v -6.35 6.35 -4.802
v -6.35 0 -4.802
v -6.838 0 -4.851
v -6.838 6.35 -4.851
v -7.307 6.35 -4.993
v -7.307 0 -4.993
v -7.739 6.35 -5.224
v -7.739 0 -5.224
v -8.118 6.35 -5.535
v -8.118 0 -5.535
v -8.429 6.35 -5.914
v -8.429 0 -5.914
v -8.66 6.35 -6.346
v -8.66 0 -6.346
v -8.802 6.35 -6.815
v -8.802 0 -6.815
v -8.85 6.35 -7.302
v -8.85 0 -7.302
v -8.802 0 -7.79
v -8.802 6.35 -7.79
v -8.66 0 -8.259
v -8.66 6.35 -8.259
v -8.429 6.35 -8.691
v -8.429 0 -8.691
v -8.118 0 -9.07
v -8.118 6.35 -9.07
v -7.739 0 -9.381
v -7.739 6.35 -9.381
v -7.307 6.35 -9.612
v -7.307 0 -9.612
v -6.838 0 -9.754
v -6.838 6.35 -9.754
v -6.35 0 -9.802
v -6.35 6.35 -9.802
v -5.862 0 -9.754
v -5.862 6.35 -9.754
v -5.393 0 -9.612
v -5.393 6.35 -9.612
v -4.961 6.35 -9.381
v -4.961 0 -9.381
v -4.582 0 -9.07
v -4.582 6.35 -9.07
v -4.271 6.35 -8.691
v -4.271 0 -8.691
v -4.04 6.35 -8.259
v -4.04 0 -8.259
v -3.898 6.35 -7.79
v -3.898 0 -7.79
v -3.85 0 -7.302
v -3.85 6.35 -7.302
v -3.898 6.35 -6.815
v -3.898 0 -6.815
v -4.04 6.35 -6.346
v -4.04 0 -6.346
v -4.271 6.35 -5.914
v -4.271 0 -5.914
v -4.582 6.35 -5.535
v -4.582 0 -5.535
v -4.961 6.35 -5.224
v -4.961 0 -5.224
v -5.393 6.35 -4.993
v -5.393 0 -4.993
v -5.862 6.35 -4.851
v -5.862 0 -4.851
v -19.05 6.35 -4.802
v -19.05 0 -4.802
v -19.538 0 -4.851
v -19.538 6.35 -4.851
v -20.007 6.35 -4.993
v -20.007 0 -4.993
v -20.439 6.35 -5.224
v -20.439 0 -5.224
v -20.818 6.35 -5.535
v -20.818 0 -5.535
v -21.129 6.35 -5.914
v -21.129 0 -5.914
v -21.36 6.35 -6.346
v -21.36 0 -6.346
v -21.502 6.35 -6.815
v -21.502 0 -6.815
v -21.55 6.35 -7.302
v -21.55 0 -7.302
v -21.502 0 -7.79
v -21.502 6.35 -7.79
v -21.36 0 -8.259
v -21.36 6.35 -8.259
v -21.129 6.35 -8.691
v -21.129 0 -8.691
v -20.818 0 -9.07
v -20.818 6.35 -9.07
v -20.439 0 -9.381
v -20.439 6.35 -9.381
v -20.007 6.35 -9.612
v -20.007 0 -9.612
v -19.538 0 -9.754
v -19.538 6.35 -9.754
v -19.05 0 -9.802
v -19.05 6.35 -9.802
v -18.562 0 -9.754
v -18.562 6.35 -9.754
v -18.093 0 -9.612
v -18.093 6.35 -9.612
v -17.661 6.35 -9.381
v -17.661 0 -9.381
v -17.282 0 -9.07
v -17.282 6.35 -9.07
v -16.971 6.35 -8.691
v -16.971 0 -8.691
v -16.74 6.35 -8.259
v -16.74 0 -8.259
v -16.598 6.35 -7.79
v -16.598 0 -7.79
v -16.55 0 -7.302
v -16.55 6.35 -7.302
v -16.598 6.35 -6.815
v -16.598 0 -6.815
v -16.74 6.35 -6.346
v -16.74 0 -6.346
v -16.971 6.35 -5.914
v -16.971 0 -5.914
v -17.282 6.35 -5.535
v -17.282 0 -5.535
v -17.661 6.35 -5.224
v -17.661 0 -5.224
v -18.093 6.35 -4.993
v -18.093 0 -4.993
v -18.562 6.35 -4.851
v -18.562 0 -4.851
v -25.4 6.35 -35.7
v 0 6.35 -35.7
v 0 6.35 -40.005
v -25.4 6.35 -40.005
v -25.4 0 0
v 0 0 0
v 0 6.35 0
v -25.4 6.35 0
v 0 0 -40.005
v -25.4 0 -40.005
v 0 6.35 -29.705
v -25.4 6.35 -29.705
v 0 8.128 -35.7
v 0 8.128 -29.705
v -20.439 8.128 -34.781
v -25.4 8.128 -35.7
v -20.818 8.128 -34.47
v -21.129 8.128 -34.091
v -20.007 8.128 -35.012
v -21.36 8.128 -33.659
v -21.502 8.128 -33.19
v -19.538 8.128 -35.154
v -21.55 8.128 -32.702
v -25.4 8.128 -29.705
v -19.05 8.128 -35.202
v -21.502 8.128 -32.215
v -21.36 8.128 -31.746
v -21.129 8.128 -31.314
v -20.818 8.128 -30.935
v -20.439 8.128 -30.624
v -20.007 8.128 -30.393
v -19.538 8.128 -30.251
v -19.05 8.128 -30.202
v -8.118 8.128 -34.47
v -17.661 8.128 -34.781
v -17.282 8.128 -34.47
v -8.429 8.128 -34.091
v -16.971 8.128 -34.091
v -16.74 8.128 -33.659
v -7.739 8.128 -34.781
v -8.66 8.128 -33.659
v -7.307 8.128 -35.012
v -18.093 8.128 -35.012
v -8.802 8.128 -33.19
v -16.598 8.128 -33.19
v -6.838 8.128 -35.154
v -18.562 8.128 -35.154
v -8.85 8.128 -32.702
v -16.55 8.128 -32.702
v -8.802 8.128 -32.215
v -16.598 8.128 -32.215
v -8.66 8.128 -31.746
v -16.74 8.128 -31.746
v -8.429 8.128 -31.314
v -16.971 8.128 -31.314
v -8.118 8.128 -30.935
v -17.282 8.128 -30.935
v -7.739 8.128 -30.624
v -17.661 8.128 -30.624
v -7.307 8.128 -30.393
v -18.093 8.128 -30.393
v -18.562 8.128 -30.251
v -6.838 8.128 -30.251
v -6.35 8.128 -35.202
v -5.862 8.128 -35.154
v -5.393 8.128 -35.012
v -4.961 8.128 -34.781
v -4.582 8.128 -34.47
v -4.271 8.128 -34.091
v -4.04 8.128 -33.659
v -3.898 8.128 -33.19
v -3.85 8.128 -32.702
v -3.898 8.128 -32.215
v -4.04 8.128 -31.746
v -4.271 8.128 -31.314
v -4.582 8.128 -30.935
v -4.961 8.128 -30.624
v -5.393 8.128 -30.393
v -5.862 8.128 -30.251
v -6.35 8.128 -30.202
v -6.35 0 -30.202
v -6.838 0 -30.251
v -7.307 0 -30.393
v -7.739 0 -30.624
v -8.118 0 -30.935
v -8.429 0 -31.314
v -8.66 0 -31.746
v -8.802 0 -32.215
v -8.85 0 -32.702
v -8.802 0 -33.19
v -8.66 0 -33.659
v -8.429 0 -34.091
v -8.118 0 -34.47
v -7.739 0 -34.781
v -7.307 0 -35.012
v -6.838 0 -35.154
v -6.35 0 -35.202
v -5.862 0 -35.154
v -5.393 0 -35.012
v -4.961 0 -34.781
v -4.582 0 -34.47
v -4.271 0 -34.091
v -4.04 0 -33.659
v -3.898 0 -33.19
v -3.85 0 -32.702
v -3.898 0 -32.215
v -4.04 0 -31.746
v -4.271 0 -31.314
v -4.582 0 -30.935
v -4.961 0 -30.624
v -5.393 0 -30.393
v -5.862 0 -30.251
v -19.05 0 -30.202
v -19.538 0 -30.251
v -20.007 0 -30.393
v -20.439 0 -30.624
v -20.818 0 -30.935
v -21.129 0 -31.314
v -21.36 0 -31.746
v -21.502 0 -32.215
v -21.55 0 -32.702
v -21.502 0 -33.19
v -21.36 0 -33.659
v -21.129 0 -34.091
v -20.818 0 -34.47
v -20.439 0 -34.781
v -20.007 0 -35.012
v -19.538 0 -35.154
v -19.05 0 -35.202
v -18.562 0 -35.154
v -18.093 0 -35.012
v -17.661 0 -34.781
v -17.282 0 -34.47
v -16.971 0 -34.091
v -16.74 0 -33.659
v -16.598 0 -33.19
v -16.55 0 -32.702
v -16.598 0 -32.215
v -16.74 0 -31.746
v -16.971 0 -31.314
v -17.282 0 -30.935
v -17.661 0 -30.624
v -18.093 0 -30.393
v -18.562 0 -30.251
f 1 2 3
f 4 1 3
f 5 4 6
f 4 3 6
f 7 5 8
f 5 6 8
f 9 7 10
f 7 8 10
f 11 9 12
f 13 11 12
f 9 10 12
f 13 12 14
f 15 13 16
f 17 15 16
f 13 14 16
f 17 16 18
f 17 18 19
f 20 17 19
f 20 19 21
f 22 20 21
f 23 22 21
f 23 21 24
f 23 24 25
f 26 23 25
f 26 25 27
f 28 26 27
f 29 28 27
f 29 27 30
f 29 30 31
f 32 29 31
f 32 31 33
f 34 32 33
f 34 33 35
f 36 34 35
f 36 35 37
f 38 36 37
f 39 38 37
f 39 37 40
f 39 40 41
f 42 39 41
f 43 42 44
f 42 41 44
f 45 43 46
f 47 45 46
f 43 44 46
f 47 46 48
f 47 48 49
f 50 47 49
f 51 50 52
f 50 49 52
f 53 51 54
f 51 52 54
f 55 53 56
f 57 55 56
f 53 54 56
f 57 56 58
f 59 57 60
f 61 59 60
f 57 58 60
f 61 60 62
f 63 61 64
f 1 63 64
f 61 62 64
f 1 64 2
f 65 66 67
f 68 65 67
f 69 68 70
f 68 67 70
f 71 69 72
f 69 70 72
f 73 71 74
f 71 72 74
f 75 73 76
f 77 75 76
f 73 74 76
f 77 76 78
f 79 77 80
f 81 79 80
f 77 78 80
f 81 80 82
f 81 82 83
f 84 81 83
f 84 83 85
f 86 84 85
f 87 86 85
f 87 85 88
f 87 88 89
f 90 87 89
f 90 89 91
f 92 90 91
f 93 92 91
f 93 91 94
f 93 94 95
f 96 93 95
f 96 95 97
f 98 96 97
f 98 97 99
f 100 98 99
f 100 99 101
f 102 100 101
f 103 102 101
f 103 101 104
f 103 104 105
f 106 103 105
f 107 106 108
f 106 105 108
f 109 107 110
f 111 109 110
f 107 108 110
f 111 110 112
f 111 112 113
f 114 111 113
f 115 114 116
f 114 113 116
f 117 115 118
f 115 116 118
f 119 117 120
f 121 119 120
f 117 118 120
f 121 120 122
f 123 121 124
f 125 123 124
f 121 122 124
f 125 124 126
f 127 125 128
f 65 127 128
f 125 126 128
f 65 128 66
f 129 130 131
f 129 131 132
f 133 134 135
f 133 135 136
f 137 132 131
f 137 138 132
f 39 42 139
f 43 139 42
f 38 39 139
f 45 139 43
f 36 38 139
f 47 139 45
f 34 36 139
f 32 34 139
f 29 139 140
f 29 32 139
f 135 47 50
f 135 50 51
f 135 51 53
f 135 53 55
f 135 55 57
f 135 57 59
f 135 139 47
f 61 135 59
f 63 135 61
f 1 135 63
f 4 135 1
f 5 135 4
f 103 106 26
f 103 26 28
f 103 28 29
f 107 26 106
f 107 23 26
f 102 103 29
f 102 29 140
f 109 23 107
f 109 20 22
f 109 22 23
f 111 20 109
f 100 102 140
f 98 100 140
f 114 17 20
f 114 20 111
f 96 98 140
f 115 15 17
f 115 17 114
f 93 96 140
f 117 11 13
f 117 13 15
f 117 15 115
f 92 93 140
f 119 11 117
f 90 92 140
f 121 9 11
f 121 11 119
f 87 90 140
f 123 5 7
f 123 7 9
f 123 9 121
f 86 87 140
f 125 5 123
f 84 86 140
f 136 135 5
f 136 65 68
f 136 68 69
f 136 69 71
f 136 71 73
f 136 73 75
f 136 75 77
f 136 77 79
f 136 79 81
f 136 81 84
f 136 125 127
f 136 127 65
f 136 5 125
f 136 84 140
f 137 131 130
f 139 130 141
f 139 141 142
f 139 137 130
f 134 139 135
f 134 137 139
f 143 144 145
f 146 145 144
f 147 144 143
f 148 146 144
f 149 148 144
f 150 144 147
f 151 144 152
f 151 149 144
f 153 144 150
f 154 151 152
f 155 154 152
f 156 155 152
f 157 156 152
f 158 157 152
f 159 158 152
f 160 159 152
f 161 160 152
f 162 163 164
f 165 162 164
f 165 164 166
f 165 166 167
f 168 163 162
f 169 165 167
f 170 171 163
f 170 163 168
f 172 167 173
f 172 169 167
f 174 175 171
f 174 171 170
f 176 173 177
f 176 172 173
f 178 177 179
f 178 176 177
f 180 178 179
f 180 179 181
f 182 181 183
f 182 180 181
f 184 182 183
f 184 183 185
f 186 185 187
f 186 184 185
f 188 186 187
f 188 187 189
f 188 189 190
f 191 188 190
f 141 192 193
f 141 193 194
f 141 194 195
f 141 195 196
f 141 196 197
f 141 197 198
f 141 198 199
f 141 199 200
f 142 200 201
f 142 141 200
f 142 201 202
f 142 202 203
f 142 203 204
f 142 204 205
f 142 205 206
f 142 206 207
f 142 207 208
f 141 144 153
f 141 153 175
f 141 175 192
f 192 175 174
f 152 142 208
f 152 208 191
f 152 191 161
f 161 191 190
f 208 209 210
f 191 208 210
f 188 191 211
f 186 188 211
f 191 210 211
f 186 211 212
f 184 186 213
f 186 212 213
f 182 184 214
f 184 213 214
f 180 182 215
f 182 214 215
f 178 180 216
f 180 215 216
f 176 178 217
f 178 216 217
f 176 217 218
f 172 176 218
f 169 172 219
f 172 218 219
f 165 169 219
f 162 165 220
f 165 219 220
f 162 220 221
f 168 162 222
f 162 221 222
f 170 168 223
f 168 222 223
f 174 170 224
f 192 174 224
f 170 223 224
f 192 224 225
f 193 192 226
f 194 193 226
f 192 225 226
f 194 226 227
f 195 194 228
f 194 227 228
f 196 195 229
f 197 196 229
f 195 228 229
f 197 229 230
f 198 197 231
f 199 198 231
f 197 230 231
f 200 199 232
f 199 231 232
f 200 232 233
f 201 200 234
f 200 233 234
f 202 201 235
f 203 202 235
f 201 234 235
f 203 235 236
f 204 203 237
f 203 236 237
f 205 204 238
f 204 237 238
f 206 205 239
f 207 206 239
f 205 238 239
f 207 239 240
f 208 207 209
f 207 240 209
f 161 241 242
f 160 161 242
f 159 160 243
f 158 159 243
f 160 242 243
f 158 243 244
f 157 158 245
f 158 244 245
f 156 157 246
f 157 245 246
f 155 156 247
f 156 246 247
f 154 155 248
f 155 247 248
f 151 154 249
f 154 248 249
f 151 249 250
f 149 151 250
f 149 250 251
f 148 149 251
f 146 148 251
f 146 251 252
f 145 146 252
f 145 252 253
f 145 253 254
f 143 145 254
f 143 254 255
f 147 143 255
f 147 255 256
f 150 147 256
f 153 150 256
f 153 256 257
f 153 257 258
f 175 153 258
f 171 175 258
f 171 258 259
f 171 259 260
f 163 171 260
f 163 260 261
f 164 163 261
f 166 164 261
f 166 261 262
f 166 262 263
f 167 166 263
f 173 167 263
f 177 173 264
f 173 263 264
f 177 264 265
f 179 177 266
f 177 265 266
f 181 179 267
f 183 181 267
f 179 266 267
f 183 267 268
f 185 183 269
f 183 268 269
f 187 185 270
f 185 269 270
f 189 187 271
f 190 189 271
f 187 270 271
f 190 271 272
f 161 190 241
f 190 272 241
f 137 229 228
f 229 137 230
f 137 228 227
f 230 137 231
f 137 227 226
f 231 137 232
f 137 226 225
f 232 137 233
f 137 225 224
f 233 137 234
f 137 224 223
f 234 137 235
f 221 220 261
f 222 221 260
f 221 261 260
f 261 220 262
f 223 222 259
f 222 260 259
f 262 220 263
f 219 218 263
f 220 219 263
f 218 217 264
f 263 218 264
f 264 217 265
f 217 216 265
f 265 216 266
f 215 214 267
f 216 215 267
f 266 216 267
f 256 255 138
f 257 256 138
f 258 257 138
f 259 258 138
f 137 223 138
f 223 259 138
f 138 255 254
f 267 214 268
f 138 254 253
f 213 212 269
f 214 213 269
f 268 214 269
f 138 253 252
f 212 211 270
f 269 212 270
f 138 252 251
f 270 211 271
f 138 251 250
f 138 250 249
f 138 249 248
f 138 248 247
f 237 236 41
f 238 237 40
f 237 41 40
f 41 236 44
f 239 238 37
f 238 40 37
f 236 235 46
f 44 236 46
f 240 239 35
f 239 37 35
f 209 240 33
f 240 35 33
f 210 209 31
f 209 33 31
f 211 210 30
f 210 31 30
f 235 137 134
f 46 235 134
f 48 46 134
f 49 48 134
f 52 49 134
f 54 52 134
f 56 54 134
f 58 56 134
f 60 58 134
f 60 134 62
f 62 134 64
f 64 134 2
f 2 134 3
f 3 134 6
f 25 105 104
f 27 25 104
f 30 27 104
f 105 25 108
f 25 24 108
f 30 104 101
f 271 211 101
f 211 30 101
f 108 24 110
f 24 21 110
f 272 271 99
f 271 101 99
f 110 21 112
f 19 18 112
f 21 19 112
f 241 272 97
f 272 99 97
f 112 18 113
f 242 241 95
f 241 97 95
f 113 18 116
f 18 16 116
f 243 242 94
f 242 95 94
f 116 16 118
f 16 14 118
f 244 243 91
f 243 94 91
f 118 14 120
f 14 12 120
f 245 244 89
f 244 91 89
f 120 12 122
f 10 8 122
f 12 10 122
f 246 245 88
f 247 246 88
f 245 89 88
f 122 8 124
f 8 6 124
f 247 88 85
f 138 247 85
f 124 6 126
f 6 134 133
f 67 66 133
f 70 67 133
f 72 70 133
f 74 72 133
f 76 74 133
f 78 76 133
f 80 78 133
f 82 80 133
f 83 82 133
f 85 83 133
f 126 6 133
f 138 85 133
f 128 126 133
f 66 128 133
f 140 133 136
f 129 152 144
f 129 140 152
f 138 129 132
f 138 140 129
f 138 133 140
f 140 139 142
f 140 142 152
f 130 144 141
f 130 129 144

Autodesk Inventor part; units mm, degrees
ref_plane "YZ Plane" through (0, 0, 0) normal (1, 0, 0) x (0, 1, 0)
ref_plane "XZ Plane" through (0, 0, 0) normal (0, 1, 0) x (-1, 0, 0)
ref_plane "XY Plane" through (0, 0, 0) normal (0, 0, 1) x (1, 0, 0)
sketch "Sketch1" plane through (0, 0, 0) normal (0, 1, 0) x (-1, 0, 0)
  line L0 (0, 0) -> (25.4, 0)
  line L1 (25.4, 0) -> (25.4, -40.005)
  line L2 (25.4, -40.005) -> (0, -40.005)
  line L3 (0, -40.005) -> (0, 0)
  dimension "d0" = 40.005
  dimension "d1" = 25.4
extrude "Extrusion1" add sketch "Sketch1" along normal blind 6.35
sketch "Sketch2" plane through (0, 6.35, 0) normal (0, 1, 0) x (1, 0, 0)
  line L0 (-25.4, 40.005) -> (-25.4, 0) projected
  line L1 (0, 0) -> (0, 40.005) projected
  line L2 (-25.4, 35.6997) -> (0, 35.6997)
  line L3 (0, 35.6997) -> (0, 29.7053)
  line L4 (0, 29.7053) -> (-25.4, 29.7053)
  line L5 (-25.4, 29.7053) -> (-25.4, 35.6997)
  line L6 (-25.4, 32.7025) -> (0, 32.7025) construction
  line L7 (-25.4, 7.3025) -> (0, 7.3025)
  line L8 (-25.4, 0) -> (0, 0) projected
  line L9 (0, 40.005) -> (-25.4, 40.005) projected
  line L10 (-25.4, 29.7053) -> (0, 29.7053)
  line L11 (0, 29.7053) -> (0, 35.6997)
  line L12 (0, 35.6997) -> (-25.4, 35.6997)
  line L13 (-25.4, 35.6997) -> (-25.4, 29.7053)
  line L14 (-12.7, 35.6997) -> (-12.7, 29.7053) construction
  line L15 (-6.35, 7.3025) -> (-6.35, 40.005) construction
  line L16 (-19.05, 7.3025) -> (-19.05, 40.005) construction
  point P0 (-12.7, 32.7025)
  dimension "d4" = 5.9944
  dimension "d5" = 25.4
  dimension "d6" = 7.3025
  dimension "d7" = 40.005
  dimension "d8" = 12.7
  dimension "d9" = 25.4
  dimension "d10" = 6.35
  dimension "d23" = 12.7
extrude "Extrusion2" add sketch "Sketch2" along normal blind 5.715 contours L2 L1 L4 L0
hole "Hole1" at (-19.05, 6.35, -7.3025) at (-6.35, 6.35, -7.3025) direction (0, -1, 0) diameter 5 end through all
sketch "Sketch3" plane through (0, 0, 0) normal (1, 0, 0) x (0, 0, -1)
  line L0 (29.7053, 12.065) -> (35.6997, 12.065) projected
  line L1 (40.005, 0) -> (0, 0) projected
  line L2 (40.005, 0) -> (40.005, 6.35) projected
  line L3 (35.6997, 6.35) -> (40.005, 6.35) projected
  line L4 (35.6997, 6.35) -> (35.6997, 12.065) projected
  line L5 (29.7053, 12.065) -> (35.6997, 12.065) projected
  line L6 (29.7053, 6.35) -> (29.7053, 12.065) projected
  line L7 (0, 6.35) -> (29.7053, 6.35) projected
  line L8 (0, 0) -> (0, 6.35) projected
  line L9 (29.7053, 6.35) -> (35.6997, 6.35)
  line L10 (35.6997, 6.35) -> (35.6997, 8.128)
  line L11 (35.6997, 6.35) -> (35.6997, 12.065) projected
  line L12 (35.6997, 8.128) -> (29.7053, 8.128)
  line L13 (29.7053, 8.128) -> (29.7053, 6.35)
  line L14 (29.7053, 8.128) -> (29.7053, 12.065)
  line L15 (29.7053, 12.065) -> (35.6997, 12.065)
  line L16 (35.6997, 12.065) -> (35.6997, 8.128)
  dimension "d20" = 1.778
extrude "Extrusion3" cut sketch "Sketch3" against normal through all contours L0 L4 L12 L6
ref_plane "Work Plane1" through (-12.7, 0, -40.005) normal (-1, 0, 0) x (0, 0, 1)
sketch "Sketch4" plane through (0, 8.128, -29.7053) normal (0, 1, 0) x (1, 0, 0)
  circle A0 centre (-6.35, -22.4028) radius 2.5 projected
  circle A1 centre (-19.05, -22.4028) radius 2.5 projected
  line L0 (0, 5.9944) -> (0, 0) projected
  point P0 (0, -29.7053)
  point P1 (-6.35, 2.9972)
  point P2 (-19.05, 2.9972)
  point P3 (0, 2.9972)
hole "Hole2" at (-6.35, 8.128, -32.7025) at (-19.05, 8.128, -32.7025) direction (0, -1, 0) diameter 5 end through all
equation "\"d6\" = -0.5 * d5 + 0.5 * d7"
equation "\"d10\" = -0.5 * d8 + 0.5 * d9"
equation "\"d24\" = d13"
equation "\"d13\" = 5"
properties part number "slider manual tension v1"
